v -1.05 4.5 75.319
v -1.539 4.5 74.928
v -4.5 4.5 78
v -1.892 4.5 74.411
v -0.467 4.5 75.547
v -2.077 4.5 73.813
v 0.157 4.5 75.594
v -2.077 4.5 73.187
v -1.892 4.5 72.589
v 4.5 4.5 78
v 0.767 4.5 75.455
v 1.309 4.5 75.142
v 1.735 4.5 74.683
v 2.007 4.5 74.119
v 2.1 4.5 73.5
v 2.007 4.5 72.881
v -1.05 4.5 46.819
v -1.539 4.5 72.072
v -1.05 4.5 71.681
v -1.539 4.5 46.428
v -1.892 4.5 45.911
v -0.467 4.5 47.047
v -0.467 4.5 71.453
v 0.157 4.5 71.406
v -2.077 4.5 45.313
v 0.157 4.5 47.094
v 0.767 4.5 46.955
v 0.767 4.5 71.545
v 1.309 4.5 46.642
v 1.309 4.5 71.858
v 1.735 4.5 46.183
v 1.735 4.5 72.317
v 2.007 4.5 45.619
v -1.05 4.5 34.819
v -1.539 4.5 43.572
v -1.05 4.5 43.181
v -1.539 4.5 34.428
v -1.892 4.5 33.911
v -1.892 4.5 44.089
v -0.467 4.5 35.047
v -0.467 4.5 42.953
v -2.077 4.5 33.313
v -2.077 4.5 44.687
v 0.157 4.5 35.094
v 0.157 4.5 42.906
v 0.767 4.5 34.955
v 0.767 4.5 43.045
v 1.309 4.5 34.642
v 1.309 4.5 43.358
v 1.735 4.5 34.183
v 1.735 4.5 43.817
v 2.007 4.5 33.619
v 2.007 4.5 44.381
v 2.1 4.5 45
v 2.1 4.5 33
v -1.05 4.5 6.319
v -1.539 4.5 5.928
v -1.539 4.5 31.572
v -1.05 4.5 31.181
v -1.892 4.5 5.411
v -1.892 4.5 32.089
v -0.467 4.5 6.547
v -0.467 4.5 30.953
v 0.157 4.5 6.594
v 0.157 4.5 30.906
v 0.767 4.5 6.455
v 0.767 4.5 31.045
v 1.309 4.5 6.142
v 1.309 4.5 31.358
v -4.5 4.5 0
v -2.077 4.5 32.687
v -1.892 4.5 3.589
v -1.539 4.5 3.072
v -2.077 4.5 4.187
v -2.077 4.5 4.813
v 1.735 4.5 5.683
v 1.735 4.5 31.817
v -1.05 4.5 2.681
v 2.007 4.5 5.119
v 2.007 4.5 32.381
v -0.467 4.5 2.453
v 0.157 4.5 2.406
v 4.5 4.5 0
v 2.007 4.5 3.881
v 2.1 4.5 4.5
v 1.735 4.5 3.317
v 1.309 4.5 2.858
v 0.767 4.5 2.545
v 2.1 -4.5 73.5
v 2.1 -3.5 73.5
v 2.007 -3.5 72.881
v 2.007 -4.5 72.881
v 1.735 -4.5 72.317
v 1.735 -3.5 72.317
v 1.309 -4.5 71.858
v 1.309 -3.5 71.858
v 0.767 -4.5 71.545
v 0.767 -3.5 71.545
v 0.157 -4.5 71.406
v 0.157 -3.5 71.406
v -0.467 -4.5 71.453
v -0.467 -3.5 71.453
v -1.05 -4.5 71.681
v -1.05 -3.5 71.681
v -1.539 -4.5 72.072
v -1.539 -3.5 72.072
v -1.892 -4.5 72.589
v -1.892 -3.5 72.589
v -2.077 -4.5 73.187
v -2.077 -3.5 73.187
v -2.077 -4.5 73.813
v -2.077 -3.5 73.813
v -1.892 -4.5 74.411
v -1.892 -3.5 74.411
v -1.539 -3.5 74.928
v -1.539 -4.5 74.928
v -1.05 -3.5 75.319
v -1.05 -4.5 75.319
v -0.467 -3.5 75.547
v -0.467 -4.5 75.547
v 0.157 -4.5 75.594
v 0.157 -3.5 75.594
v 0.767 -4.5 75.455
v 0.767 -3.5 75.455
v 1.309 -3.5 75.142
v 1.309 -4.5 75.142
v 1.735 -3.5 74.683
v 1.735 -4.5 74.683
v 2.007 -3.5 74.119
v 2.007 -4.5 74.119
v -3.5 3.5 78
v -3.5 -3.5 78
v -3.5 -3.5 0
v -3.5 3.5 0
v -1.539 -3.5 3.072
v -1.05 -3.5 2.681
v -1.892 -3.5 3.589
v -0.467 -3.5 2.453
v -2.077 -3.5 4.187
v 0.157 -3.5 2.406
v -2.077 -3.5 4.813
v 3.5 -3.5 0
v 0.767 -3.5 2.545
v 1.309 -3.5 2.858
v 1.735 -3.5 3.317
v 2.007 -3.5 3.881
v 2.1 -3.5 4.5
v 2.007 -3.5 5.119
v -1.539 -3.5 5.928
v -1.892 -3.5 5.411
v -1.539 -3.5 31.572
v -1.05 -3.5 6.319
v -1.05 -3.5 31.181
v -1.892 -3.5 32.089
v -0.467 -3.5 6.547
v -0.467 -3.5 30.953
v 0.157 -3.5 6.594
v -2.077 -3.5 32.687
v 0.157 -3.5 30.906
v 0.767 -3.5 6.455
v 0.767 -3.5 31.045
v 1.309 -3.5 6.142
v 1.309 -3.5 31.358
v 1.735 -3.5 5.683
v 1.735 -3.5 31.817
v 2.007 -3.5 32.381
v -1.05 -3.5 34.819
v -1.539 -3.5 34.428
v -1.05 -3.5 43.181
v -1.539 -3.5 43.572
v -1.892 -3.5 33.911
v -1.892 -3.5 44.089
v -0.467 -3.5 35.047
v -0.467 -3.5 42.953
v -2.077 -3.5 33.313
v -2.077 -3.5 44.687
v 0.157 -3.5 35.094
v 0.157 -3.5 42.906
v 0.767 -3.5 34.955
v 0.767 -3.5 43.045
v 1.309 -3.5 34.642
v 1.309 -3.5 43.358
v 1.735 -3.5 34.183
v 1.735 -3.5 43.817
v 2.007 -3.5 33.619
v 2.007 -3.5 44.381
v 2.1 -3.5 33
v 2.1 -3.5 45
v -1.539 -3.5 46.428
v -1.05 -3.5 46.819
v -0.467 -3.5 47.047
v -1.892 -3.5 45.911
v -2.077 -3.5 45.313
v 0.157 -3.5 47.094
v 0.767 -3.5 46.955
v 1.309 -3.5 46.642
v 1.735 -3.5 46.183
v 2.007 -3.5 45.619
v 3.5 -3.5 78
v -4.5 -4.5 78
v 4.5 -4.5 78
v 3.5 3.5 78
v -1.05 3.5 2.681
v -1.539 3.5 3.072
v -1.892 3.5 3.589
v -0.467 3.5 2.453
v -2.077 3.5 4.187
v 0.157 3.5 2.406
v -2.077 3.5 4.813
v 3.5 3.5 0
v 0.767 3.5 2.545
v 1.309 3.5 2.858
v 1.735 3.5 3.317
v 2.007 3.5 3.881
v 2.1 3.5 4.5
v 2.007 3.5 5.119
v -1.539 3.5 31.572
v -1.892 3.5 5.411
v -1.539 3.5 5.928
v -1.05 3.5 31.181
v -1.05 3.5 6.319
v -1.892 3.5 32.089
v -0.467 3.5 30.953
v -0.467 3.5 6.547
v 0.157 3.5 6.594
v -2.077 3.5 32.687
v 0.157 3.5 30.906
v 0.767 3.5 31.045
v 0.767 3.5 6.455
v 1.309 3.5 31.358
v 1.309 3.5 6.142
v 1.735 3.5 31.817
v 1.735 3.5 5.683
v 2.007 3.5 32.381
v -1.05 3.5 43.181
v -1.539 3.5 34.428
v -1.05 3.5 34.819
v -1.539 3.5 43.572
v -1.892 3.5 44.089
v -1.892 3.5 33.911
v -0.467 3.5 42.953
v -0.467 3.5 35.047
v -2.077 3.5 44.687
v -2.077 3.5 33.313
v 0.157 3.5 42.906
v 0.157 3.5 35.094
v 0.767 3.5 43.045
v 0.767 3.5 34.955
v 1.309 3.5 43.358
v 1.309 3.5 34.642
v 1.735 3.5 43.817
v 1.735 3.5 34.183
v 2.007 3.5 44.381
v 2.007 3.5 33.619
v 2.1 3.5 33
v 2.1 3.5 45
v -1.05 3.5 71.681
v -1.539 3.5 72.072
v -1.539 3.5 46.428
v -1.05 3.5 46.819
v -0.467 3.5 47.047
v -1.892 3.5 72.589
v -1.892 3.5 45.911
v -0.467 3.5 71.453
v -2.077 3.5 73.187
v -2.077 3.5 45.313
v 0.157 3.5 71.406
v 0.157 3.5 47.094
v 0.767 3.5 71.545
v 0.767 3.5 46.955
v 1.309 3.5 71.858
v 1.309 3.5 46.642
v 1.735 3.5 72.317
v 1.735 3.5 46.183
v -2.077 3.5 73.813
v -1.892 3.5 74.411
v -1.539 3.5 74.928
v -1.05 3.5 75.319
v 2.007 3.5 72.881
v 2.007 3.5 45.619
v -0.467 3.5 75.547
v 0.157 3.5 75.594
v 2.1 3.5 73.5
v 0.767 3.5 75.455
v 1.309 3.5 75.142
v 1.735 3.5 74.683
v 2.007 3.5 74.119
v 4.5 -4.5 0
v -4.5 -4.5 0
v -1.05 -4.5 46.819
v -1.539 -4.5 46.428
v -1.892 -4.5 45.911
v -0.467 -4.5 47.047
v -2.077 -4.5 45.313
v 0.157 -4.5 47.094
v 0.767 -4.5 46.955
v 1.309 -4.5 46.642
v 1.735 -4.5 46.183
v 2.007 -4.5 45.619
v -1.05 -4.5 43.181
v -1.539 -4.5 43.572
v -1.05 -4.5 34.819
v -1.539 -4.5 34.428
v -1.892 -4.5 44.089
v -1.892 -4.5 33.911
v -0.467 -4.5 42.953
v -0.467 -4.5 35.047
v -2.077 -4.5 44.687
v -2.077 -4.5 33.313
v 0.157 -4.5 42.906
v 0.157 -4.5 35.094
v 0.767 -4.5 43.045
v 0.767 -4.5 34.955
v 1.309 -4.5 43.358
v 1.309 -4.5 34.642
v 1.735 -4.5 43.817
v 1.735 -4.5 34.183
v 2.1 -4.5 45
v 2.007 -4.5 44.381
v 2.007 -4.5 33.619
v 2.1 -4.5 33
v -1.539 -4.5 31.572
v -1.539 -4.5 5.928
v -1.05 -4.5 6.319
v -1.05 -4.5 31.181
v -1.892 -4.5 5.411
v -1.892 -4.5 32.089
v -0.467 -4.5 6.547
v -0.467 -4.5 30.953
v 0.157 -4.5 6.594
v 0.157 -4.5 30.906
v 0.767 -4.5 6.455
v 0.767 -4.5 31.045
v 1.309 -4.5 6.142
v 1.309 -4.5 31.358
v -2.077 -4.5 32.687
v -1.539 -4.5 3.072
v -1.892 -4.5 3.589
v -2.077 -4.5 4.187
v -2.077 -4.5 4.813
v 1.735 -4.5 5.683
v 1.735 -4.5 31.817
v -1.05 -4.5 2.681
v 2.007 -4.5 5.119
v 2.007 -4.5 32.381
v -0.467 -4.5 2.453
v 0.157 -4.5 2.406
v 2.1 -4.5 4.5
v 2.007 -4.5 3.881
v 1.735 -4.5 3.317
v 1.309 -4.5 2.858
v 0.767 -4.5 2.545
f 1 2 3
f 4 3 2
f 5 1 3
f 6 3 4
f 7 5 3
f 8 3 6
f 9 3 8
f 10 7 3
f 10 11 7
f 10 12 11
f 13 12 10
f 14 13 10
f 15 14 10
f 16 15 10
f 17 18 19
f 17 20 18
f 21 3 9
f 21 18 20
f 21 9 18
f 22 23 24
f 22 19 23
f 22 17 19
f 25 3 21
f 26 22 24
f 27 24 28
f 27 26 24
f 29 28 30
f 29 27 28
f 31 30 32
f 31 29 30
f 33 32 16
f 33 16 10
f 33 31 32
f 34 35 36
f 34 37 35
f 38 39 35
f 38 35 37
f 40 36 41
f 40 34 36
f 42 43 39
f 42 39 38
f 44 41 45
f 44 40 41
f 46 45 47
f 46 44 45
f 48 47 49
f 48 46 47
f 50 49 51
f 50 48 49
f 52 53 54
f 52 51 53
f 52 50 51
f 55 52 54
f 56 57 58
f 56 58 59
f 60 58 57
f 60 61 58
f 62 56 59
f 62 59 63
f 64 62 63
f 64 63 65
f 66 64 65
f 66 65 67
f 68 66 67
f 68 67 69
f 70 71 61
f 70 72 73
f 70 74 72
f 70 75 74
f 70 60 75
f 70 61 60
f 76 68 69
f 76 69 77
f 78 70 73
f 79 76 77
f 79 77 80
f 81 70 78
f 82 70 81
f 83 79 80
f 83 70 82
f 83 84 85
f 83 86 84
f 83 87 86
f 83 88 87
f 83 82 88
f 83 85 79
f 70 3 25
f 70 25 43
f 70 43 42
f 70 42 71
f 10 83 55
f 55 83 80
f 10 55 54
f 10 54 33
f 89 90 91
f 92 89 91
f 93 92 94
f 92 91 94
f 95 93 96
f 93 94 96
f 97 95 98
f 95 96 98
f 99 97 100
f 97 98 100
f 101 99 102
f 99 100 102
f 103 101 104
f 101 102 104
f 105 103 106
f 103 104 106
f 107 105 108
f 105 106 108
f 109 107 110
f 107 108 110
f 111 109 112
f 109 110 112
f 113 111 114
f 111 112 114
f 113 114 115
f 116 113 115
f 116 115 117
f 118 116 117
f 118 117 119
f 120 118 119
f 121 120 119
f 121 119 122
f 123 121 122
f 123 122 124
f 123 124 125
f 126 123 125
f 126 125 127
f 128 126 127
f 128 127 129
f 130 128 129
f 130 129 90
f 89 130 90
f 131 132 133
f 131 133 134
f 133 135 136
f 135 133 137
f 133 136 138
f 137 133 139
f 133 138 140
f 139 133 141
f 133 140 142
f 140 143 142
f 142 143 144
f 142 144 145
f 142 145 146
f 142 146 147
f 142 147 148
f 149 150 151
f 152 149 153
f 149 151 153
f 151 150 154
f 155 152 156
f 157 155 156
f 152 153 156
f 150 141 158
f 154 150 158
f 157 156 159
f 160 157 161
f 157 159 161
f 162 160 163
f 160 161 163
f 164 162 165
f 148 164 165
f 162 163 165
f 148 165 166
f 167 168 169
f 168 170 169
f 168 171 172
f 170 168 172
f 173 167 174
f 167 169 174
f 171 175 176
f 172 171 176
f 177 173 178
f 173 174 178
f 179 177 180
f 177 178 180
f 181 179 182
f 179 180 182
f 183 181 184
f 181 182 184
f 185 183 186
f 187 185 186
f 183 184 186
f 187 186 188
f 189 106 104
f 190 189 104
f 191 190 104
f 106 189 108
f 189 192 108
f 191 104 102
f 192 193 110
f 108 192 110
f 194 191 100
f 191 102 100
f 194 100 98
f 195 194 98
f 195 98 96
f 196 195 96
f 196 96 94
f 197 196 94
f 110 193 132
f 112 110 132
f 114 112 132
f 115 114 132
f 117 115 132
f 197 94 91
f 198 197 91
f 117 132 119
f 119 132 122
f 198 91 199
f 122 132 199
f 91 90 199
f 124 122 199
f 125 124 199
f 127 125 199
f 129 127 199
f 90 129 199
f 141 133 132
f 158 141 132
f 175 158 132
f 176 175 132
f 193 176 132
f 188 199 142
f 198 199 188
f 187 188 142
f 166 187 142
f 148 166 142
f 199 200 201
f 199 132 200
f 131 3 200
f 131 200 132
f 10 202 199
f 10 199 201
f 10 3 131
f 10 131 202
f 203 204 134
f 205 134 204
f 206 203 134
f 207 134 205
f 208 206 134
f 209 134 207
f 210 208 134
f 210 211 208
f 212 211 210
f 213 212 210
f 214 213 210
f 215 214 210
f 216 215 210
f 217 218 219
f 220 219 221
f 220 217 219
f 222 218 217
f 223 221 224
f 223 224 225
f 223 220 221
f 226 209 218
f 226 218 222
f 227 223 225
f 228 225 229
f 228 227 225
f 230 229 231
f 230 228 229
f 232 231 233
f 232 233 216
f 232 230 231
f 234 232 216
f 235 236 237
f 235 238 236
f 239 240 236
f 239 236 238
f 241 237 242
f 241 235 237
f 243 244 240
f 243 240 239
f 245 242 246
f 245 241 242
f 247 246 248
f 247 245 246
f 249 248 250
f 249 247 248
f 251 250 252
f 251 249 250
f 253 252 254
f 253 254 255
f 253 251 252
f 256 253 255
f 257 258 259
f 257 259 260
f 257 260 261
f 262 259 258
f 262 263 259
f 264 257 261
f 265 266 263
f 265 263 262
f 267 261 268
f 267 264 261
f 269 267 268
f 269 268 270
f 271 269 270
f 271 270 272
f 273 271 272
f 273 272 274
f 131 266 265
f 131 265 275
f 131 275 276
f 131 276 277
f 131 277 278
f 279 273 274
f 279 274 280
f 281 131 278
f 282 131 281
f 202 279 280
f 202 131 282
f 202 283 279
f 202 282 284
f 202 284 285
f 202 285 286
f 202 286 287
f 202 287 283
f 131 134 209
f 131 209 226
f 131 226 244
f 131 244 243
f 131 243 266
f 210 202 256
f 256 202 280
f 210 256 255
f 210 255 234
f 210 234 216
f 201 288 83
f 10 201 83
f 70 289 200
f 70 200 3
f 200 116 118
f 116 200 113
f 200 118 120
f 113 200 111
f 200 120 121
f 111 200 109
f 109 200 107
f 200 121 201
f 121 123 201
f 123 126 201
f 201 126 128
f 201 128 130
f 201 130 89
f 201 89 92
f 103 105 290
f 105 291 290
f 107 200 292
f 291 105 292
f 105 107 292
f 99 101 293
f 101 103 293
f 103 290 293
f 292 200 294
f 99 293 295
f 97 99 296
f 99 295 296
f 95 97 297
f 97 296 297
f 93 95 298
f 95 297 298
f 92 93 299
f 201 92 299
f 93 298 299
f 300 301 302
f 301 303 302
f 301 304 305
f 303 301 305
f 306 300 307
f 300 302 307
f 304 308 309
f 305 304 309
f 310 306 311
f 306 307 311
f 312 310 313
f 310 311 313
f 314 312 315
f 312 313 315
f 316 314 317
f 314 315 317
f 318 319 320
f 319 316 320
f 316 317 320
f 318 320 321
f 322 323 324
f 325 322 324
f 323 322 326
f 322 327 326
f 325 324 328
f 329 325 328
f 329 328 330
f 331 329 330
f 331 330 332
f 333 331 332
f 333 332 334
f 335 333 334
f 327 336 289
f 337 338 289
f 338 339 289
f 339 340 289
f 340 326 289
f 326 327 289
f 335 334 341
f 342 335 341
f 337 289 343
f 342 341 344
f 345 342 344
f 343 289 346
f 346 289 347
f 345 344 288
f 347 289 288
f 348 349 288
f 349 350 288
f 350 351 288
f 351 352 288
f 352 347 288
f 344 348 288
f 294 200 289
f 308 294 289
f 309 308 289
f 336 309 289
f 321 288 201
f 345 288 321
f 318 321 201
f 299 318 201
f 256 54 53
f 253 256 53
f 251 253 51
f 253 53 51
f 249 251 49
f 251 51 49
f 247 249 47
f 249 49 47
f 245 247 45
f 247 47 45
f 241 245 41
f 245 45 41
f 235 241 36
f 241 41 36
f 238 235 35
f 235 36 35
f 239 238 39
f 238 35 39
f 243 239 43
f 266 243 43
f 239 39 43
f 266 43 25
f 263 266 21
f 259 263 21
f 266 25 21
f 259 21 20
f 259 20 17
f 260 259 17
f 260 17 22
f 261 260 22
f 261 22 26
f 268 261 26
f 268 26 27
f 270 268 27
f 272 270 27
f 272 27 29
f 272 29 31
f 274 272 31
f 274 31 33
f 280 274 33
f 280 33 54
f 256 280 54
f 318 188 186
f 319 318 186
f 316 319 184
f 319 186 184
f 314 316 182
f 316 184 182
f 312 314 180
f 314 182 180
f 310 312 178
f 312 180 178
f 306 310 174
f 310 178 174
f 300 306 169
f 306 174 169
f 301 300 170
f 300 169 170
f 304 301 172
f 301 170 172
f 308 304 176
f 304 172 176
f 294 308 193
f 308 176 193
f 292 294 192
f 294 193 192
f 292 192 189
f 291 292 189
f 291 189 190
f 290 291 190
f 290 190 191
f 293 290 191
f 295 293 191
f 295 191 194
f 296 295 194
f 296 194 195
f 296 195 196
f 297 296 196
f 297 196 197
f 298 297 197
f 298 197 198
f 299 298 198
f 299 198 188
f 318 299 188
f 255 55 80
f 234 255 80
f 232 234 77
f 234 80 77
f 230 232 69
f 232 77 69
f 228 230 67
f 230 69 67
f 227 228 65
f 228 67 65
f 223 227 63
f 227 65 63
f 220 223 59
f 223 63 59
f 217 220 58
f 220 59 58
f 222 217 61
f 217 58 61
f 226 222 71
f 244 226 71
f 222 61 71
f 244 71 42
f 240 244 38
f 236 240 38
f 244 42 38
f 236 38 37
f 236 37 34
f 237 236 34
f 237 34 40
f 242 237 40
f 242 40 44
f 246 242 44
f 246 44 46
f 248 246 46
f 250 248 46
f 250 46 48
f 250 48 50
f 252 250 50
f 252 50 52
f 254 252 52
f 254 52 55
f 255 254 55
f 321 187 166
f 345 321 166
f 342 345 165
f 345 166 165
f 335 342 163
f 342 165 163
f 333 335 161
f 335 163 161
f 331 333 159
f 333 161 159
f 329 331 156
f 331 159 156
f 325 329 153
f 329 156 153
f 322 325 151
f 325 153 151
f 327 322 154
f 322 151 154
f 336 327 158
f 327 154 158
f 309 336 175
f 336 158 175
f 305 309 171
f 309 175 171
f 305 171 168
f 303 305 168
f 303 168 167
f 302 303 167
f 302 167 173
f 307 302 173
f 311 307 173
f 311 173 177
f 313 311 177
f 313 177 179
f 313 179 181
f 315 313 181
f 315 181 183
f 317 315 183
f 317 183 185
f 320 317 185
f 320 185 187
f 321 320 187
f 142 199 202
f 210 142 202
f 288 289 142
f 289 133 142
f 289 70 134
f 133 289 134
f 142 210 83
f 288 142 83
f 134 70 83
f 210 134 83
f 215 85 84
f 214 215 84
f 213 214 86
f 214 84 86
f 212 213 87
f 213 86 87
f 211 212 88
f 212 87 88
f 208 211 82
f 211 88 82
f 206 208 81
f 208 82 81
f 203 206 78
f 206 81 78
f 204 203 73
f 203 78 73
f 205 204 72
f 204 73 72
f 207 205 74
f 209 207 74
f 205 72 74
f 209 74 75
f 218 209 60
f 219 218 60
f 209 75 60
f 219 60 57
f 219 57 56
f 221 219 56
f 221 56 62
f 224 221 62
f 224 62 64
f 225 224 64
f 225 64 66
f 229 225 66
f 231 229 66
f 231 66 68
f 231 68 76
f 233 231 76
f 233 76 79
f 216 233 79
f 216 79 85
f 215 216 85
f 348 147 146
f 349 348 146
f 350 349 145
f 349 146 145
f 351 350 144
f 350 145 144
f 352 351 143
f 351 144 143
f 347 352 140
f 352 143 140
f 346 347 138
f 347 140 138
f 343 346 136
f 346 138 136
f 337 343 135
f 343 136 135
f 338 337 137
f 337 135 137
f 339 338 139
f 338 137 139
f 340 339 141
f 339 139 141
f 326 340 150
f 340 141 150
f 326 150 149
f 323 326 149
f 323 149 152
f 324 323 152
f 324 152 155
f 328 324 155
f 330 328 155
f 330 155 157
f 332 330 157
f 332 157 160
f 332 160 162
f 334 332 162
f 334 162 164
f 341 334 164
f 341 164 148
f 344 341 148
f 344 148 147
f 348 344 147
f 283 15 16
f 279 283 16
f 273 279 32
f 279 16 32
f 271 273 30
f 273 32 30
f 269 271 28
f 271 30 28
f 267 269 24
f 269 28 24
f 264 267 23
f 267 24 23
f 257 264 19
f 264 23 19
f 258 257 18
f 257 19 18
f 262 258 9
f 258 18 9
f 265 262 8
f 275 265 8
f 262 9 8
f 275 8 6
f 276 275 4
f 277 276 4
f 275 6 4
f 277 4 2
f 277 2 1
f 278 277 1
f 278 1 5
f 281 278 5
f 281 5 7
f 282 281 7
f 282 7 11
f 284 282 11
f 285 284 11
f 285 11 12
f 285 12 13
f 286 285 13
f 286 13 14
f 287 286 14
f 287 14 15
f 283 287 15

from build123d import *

# Parameters (mm, degrees)
SKETCH_1_W          = 9
SKETCH_1_H          = 9
EXTRUDE_1_DEPTH     = 78
SKETCH_2_W          = 7
SKETCH_2_H          = 7
CUT_EXTRUDE_1_DEPTH = 78
SKETCH_3_R          = 2.1
CUT_EXTRUDE_2_DEPTH = 75
SKETCH_4_R          = 2.1
CUT_EXTRUDE_3_DEPTH = 75


with BuildPart() as part:
    # ｽｹｯﾁ1 → ﾎﾞｽ - 押し出し1 (new body)
    with BuildSketch(Plane.XY):
        Rectangle(SKETCH_1_W, SKETCH_1_H)
    extrude(amount=EXTRUDE_1_DEPTH)

    # ｽｹｯﾁ2 → ｶｯﾄ - 押し出し1 (cut)
    with BuildSketch(Plane.XY.offset(78)):
        Rectangle(SKETCH_2_W, SKETCH_2_H)
    extrude(amount=-CUT_EXTRUDE_1_DEPTH, mode=Mode.SUBTRACT)

    # ｽｹｯﾁ3 → ｶｯﾄ - 押し出し2 (cut)
    with BuildSketch(Plane(origin=(0, 4.5, 0), x_dir=(1, 0, 0), z_dir=(0, 1, 0))):
        with Locations((0, -4.5)):
            Circle(SKETCH_3_R)
        with Locations((0, -73.5)):
            Circle(SKETCH_3_R)
    extrude(amount=-CUT_EXTRUDE_2_DEPTH, mode=Mode.SUBTRACT)

    # ｽｹｯﾁ4 → ｶｯﾄ - 押し出し3 (cut)
    with BuildSketch(Plane(origin=(0, 4.5, 0), x_dir=(1, 0, 0), z_dir=(0, 1, 0))):
        with Locations((0, -33)):
            Circle(SKETCH_4_R)
        with Locations((0, -45)):
            Circle(SKETCH_4_R)
    extrude(amount=-CUT_EXTRUDE_3_DEPTH, mode=Mode.SUBTRACT)


solid = part.part
